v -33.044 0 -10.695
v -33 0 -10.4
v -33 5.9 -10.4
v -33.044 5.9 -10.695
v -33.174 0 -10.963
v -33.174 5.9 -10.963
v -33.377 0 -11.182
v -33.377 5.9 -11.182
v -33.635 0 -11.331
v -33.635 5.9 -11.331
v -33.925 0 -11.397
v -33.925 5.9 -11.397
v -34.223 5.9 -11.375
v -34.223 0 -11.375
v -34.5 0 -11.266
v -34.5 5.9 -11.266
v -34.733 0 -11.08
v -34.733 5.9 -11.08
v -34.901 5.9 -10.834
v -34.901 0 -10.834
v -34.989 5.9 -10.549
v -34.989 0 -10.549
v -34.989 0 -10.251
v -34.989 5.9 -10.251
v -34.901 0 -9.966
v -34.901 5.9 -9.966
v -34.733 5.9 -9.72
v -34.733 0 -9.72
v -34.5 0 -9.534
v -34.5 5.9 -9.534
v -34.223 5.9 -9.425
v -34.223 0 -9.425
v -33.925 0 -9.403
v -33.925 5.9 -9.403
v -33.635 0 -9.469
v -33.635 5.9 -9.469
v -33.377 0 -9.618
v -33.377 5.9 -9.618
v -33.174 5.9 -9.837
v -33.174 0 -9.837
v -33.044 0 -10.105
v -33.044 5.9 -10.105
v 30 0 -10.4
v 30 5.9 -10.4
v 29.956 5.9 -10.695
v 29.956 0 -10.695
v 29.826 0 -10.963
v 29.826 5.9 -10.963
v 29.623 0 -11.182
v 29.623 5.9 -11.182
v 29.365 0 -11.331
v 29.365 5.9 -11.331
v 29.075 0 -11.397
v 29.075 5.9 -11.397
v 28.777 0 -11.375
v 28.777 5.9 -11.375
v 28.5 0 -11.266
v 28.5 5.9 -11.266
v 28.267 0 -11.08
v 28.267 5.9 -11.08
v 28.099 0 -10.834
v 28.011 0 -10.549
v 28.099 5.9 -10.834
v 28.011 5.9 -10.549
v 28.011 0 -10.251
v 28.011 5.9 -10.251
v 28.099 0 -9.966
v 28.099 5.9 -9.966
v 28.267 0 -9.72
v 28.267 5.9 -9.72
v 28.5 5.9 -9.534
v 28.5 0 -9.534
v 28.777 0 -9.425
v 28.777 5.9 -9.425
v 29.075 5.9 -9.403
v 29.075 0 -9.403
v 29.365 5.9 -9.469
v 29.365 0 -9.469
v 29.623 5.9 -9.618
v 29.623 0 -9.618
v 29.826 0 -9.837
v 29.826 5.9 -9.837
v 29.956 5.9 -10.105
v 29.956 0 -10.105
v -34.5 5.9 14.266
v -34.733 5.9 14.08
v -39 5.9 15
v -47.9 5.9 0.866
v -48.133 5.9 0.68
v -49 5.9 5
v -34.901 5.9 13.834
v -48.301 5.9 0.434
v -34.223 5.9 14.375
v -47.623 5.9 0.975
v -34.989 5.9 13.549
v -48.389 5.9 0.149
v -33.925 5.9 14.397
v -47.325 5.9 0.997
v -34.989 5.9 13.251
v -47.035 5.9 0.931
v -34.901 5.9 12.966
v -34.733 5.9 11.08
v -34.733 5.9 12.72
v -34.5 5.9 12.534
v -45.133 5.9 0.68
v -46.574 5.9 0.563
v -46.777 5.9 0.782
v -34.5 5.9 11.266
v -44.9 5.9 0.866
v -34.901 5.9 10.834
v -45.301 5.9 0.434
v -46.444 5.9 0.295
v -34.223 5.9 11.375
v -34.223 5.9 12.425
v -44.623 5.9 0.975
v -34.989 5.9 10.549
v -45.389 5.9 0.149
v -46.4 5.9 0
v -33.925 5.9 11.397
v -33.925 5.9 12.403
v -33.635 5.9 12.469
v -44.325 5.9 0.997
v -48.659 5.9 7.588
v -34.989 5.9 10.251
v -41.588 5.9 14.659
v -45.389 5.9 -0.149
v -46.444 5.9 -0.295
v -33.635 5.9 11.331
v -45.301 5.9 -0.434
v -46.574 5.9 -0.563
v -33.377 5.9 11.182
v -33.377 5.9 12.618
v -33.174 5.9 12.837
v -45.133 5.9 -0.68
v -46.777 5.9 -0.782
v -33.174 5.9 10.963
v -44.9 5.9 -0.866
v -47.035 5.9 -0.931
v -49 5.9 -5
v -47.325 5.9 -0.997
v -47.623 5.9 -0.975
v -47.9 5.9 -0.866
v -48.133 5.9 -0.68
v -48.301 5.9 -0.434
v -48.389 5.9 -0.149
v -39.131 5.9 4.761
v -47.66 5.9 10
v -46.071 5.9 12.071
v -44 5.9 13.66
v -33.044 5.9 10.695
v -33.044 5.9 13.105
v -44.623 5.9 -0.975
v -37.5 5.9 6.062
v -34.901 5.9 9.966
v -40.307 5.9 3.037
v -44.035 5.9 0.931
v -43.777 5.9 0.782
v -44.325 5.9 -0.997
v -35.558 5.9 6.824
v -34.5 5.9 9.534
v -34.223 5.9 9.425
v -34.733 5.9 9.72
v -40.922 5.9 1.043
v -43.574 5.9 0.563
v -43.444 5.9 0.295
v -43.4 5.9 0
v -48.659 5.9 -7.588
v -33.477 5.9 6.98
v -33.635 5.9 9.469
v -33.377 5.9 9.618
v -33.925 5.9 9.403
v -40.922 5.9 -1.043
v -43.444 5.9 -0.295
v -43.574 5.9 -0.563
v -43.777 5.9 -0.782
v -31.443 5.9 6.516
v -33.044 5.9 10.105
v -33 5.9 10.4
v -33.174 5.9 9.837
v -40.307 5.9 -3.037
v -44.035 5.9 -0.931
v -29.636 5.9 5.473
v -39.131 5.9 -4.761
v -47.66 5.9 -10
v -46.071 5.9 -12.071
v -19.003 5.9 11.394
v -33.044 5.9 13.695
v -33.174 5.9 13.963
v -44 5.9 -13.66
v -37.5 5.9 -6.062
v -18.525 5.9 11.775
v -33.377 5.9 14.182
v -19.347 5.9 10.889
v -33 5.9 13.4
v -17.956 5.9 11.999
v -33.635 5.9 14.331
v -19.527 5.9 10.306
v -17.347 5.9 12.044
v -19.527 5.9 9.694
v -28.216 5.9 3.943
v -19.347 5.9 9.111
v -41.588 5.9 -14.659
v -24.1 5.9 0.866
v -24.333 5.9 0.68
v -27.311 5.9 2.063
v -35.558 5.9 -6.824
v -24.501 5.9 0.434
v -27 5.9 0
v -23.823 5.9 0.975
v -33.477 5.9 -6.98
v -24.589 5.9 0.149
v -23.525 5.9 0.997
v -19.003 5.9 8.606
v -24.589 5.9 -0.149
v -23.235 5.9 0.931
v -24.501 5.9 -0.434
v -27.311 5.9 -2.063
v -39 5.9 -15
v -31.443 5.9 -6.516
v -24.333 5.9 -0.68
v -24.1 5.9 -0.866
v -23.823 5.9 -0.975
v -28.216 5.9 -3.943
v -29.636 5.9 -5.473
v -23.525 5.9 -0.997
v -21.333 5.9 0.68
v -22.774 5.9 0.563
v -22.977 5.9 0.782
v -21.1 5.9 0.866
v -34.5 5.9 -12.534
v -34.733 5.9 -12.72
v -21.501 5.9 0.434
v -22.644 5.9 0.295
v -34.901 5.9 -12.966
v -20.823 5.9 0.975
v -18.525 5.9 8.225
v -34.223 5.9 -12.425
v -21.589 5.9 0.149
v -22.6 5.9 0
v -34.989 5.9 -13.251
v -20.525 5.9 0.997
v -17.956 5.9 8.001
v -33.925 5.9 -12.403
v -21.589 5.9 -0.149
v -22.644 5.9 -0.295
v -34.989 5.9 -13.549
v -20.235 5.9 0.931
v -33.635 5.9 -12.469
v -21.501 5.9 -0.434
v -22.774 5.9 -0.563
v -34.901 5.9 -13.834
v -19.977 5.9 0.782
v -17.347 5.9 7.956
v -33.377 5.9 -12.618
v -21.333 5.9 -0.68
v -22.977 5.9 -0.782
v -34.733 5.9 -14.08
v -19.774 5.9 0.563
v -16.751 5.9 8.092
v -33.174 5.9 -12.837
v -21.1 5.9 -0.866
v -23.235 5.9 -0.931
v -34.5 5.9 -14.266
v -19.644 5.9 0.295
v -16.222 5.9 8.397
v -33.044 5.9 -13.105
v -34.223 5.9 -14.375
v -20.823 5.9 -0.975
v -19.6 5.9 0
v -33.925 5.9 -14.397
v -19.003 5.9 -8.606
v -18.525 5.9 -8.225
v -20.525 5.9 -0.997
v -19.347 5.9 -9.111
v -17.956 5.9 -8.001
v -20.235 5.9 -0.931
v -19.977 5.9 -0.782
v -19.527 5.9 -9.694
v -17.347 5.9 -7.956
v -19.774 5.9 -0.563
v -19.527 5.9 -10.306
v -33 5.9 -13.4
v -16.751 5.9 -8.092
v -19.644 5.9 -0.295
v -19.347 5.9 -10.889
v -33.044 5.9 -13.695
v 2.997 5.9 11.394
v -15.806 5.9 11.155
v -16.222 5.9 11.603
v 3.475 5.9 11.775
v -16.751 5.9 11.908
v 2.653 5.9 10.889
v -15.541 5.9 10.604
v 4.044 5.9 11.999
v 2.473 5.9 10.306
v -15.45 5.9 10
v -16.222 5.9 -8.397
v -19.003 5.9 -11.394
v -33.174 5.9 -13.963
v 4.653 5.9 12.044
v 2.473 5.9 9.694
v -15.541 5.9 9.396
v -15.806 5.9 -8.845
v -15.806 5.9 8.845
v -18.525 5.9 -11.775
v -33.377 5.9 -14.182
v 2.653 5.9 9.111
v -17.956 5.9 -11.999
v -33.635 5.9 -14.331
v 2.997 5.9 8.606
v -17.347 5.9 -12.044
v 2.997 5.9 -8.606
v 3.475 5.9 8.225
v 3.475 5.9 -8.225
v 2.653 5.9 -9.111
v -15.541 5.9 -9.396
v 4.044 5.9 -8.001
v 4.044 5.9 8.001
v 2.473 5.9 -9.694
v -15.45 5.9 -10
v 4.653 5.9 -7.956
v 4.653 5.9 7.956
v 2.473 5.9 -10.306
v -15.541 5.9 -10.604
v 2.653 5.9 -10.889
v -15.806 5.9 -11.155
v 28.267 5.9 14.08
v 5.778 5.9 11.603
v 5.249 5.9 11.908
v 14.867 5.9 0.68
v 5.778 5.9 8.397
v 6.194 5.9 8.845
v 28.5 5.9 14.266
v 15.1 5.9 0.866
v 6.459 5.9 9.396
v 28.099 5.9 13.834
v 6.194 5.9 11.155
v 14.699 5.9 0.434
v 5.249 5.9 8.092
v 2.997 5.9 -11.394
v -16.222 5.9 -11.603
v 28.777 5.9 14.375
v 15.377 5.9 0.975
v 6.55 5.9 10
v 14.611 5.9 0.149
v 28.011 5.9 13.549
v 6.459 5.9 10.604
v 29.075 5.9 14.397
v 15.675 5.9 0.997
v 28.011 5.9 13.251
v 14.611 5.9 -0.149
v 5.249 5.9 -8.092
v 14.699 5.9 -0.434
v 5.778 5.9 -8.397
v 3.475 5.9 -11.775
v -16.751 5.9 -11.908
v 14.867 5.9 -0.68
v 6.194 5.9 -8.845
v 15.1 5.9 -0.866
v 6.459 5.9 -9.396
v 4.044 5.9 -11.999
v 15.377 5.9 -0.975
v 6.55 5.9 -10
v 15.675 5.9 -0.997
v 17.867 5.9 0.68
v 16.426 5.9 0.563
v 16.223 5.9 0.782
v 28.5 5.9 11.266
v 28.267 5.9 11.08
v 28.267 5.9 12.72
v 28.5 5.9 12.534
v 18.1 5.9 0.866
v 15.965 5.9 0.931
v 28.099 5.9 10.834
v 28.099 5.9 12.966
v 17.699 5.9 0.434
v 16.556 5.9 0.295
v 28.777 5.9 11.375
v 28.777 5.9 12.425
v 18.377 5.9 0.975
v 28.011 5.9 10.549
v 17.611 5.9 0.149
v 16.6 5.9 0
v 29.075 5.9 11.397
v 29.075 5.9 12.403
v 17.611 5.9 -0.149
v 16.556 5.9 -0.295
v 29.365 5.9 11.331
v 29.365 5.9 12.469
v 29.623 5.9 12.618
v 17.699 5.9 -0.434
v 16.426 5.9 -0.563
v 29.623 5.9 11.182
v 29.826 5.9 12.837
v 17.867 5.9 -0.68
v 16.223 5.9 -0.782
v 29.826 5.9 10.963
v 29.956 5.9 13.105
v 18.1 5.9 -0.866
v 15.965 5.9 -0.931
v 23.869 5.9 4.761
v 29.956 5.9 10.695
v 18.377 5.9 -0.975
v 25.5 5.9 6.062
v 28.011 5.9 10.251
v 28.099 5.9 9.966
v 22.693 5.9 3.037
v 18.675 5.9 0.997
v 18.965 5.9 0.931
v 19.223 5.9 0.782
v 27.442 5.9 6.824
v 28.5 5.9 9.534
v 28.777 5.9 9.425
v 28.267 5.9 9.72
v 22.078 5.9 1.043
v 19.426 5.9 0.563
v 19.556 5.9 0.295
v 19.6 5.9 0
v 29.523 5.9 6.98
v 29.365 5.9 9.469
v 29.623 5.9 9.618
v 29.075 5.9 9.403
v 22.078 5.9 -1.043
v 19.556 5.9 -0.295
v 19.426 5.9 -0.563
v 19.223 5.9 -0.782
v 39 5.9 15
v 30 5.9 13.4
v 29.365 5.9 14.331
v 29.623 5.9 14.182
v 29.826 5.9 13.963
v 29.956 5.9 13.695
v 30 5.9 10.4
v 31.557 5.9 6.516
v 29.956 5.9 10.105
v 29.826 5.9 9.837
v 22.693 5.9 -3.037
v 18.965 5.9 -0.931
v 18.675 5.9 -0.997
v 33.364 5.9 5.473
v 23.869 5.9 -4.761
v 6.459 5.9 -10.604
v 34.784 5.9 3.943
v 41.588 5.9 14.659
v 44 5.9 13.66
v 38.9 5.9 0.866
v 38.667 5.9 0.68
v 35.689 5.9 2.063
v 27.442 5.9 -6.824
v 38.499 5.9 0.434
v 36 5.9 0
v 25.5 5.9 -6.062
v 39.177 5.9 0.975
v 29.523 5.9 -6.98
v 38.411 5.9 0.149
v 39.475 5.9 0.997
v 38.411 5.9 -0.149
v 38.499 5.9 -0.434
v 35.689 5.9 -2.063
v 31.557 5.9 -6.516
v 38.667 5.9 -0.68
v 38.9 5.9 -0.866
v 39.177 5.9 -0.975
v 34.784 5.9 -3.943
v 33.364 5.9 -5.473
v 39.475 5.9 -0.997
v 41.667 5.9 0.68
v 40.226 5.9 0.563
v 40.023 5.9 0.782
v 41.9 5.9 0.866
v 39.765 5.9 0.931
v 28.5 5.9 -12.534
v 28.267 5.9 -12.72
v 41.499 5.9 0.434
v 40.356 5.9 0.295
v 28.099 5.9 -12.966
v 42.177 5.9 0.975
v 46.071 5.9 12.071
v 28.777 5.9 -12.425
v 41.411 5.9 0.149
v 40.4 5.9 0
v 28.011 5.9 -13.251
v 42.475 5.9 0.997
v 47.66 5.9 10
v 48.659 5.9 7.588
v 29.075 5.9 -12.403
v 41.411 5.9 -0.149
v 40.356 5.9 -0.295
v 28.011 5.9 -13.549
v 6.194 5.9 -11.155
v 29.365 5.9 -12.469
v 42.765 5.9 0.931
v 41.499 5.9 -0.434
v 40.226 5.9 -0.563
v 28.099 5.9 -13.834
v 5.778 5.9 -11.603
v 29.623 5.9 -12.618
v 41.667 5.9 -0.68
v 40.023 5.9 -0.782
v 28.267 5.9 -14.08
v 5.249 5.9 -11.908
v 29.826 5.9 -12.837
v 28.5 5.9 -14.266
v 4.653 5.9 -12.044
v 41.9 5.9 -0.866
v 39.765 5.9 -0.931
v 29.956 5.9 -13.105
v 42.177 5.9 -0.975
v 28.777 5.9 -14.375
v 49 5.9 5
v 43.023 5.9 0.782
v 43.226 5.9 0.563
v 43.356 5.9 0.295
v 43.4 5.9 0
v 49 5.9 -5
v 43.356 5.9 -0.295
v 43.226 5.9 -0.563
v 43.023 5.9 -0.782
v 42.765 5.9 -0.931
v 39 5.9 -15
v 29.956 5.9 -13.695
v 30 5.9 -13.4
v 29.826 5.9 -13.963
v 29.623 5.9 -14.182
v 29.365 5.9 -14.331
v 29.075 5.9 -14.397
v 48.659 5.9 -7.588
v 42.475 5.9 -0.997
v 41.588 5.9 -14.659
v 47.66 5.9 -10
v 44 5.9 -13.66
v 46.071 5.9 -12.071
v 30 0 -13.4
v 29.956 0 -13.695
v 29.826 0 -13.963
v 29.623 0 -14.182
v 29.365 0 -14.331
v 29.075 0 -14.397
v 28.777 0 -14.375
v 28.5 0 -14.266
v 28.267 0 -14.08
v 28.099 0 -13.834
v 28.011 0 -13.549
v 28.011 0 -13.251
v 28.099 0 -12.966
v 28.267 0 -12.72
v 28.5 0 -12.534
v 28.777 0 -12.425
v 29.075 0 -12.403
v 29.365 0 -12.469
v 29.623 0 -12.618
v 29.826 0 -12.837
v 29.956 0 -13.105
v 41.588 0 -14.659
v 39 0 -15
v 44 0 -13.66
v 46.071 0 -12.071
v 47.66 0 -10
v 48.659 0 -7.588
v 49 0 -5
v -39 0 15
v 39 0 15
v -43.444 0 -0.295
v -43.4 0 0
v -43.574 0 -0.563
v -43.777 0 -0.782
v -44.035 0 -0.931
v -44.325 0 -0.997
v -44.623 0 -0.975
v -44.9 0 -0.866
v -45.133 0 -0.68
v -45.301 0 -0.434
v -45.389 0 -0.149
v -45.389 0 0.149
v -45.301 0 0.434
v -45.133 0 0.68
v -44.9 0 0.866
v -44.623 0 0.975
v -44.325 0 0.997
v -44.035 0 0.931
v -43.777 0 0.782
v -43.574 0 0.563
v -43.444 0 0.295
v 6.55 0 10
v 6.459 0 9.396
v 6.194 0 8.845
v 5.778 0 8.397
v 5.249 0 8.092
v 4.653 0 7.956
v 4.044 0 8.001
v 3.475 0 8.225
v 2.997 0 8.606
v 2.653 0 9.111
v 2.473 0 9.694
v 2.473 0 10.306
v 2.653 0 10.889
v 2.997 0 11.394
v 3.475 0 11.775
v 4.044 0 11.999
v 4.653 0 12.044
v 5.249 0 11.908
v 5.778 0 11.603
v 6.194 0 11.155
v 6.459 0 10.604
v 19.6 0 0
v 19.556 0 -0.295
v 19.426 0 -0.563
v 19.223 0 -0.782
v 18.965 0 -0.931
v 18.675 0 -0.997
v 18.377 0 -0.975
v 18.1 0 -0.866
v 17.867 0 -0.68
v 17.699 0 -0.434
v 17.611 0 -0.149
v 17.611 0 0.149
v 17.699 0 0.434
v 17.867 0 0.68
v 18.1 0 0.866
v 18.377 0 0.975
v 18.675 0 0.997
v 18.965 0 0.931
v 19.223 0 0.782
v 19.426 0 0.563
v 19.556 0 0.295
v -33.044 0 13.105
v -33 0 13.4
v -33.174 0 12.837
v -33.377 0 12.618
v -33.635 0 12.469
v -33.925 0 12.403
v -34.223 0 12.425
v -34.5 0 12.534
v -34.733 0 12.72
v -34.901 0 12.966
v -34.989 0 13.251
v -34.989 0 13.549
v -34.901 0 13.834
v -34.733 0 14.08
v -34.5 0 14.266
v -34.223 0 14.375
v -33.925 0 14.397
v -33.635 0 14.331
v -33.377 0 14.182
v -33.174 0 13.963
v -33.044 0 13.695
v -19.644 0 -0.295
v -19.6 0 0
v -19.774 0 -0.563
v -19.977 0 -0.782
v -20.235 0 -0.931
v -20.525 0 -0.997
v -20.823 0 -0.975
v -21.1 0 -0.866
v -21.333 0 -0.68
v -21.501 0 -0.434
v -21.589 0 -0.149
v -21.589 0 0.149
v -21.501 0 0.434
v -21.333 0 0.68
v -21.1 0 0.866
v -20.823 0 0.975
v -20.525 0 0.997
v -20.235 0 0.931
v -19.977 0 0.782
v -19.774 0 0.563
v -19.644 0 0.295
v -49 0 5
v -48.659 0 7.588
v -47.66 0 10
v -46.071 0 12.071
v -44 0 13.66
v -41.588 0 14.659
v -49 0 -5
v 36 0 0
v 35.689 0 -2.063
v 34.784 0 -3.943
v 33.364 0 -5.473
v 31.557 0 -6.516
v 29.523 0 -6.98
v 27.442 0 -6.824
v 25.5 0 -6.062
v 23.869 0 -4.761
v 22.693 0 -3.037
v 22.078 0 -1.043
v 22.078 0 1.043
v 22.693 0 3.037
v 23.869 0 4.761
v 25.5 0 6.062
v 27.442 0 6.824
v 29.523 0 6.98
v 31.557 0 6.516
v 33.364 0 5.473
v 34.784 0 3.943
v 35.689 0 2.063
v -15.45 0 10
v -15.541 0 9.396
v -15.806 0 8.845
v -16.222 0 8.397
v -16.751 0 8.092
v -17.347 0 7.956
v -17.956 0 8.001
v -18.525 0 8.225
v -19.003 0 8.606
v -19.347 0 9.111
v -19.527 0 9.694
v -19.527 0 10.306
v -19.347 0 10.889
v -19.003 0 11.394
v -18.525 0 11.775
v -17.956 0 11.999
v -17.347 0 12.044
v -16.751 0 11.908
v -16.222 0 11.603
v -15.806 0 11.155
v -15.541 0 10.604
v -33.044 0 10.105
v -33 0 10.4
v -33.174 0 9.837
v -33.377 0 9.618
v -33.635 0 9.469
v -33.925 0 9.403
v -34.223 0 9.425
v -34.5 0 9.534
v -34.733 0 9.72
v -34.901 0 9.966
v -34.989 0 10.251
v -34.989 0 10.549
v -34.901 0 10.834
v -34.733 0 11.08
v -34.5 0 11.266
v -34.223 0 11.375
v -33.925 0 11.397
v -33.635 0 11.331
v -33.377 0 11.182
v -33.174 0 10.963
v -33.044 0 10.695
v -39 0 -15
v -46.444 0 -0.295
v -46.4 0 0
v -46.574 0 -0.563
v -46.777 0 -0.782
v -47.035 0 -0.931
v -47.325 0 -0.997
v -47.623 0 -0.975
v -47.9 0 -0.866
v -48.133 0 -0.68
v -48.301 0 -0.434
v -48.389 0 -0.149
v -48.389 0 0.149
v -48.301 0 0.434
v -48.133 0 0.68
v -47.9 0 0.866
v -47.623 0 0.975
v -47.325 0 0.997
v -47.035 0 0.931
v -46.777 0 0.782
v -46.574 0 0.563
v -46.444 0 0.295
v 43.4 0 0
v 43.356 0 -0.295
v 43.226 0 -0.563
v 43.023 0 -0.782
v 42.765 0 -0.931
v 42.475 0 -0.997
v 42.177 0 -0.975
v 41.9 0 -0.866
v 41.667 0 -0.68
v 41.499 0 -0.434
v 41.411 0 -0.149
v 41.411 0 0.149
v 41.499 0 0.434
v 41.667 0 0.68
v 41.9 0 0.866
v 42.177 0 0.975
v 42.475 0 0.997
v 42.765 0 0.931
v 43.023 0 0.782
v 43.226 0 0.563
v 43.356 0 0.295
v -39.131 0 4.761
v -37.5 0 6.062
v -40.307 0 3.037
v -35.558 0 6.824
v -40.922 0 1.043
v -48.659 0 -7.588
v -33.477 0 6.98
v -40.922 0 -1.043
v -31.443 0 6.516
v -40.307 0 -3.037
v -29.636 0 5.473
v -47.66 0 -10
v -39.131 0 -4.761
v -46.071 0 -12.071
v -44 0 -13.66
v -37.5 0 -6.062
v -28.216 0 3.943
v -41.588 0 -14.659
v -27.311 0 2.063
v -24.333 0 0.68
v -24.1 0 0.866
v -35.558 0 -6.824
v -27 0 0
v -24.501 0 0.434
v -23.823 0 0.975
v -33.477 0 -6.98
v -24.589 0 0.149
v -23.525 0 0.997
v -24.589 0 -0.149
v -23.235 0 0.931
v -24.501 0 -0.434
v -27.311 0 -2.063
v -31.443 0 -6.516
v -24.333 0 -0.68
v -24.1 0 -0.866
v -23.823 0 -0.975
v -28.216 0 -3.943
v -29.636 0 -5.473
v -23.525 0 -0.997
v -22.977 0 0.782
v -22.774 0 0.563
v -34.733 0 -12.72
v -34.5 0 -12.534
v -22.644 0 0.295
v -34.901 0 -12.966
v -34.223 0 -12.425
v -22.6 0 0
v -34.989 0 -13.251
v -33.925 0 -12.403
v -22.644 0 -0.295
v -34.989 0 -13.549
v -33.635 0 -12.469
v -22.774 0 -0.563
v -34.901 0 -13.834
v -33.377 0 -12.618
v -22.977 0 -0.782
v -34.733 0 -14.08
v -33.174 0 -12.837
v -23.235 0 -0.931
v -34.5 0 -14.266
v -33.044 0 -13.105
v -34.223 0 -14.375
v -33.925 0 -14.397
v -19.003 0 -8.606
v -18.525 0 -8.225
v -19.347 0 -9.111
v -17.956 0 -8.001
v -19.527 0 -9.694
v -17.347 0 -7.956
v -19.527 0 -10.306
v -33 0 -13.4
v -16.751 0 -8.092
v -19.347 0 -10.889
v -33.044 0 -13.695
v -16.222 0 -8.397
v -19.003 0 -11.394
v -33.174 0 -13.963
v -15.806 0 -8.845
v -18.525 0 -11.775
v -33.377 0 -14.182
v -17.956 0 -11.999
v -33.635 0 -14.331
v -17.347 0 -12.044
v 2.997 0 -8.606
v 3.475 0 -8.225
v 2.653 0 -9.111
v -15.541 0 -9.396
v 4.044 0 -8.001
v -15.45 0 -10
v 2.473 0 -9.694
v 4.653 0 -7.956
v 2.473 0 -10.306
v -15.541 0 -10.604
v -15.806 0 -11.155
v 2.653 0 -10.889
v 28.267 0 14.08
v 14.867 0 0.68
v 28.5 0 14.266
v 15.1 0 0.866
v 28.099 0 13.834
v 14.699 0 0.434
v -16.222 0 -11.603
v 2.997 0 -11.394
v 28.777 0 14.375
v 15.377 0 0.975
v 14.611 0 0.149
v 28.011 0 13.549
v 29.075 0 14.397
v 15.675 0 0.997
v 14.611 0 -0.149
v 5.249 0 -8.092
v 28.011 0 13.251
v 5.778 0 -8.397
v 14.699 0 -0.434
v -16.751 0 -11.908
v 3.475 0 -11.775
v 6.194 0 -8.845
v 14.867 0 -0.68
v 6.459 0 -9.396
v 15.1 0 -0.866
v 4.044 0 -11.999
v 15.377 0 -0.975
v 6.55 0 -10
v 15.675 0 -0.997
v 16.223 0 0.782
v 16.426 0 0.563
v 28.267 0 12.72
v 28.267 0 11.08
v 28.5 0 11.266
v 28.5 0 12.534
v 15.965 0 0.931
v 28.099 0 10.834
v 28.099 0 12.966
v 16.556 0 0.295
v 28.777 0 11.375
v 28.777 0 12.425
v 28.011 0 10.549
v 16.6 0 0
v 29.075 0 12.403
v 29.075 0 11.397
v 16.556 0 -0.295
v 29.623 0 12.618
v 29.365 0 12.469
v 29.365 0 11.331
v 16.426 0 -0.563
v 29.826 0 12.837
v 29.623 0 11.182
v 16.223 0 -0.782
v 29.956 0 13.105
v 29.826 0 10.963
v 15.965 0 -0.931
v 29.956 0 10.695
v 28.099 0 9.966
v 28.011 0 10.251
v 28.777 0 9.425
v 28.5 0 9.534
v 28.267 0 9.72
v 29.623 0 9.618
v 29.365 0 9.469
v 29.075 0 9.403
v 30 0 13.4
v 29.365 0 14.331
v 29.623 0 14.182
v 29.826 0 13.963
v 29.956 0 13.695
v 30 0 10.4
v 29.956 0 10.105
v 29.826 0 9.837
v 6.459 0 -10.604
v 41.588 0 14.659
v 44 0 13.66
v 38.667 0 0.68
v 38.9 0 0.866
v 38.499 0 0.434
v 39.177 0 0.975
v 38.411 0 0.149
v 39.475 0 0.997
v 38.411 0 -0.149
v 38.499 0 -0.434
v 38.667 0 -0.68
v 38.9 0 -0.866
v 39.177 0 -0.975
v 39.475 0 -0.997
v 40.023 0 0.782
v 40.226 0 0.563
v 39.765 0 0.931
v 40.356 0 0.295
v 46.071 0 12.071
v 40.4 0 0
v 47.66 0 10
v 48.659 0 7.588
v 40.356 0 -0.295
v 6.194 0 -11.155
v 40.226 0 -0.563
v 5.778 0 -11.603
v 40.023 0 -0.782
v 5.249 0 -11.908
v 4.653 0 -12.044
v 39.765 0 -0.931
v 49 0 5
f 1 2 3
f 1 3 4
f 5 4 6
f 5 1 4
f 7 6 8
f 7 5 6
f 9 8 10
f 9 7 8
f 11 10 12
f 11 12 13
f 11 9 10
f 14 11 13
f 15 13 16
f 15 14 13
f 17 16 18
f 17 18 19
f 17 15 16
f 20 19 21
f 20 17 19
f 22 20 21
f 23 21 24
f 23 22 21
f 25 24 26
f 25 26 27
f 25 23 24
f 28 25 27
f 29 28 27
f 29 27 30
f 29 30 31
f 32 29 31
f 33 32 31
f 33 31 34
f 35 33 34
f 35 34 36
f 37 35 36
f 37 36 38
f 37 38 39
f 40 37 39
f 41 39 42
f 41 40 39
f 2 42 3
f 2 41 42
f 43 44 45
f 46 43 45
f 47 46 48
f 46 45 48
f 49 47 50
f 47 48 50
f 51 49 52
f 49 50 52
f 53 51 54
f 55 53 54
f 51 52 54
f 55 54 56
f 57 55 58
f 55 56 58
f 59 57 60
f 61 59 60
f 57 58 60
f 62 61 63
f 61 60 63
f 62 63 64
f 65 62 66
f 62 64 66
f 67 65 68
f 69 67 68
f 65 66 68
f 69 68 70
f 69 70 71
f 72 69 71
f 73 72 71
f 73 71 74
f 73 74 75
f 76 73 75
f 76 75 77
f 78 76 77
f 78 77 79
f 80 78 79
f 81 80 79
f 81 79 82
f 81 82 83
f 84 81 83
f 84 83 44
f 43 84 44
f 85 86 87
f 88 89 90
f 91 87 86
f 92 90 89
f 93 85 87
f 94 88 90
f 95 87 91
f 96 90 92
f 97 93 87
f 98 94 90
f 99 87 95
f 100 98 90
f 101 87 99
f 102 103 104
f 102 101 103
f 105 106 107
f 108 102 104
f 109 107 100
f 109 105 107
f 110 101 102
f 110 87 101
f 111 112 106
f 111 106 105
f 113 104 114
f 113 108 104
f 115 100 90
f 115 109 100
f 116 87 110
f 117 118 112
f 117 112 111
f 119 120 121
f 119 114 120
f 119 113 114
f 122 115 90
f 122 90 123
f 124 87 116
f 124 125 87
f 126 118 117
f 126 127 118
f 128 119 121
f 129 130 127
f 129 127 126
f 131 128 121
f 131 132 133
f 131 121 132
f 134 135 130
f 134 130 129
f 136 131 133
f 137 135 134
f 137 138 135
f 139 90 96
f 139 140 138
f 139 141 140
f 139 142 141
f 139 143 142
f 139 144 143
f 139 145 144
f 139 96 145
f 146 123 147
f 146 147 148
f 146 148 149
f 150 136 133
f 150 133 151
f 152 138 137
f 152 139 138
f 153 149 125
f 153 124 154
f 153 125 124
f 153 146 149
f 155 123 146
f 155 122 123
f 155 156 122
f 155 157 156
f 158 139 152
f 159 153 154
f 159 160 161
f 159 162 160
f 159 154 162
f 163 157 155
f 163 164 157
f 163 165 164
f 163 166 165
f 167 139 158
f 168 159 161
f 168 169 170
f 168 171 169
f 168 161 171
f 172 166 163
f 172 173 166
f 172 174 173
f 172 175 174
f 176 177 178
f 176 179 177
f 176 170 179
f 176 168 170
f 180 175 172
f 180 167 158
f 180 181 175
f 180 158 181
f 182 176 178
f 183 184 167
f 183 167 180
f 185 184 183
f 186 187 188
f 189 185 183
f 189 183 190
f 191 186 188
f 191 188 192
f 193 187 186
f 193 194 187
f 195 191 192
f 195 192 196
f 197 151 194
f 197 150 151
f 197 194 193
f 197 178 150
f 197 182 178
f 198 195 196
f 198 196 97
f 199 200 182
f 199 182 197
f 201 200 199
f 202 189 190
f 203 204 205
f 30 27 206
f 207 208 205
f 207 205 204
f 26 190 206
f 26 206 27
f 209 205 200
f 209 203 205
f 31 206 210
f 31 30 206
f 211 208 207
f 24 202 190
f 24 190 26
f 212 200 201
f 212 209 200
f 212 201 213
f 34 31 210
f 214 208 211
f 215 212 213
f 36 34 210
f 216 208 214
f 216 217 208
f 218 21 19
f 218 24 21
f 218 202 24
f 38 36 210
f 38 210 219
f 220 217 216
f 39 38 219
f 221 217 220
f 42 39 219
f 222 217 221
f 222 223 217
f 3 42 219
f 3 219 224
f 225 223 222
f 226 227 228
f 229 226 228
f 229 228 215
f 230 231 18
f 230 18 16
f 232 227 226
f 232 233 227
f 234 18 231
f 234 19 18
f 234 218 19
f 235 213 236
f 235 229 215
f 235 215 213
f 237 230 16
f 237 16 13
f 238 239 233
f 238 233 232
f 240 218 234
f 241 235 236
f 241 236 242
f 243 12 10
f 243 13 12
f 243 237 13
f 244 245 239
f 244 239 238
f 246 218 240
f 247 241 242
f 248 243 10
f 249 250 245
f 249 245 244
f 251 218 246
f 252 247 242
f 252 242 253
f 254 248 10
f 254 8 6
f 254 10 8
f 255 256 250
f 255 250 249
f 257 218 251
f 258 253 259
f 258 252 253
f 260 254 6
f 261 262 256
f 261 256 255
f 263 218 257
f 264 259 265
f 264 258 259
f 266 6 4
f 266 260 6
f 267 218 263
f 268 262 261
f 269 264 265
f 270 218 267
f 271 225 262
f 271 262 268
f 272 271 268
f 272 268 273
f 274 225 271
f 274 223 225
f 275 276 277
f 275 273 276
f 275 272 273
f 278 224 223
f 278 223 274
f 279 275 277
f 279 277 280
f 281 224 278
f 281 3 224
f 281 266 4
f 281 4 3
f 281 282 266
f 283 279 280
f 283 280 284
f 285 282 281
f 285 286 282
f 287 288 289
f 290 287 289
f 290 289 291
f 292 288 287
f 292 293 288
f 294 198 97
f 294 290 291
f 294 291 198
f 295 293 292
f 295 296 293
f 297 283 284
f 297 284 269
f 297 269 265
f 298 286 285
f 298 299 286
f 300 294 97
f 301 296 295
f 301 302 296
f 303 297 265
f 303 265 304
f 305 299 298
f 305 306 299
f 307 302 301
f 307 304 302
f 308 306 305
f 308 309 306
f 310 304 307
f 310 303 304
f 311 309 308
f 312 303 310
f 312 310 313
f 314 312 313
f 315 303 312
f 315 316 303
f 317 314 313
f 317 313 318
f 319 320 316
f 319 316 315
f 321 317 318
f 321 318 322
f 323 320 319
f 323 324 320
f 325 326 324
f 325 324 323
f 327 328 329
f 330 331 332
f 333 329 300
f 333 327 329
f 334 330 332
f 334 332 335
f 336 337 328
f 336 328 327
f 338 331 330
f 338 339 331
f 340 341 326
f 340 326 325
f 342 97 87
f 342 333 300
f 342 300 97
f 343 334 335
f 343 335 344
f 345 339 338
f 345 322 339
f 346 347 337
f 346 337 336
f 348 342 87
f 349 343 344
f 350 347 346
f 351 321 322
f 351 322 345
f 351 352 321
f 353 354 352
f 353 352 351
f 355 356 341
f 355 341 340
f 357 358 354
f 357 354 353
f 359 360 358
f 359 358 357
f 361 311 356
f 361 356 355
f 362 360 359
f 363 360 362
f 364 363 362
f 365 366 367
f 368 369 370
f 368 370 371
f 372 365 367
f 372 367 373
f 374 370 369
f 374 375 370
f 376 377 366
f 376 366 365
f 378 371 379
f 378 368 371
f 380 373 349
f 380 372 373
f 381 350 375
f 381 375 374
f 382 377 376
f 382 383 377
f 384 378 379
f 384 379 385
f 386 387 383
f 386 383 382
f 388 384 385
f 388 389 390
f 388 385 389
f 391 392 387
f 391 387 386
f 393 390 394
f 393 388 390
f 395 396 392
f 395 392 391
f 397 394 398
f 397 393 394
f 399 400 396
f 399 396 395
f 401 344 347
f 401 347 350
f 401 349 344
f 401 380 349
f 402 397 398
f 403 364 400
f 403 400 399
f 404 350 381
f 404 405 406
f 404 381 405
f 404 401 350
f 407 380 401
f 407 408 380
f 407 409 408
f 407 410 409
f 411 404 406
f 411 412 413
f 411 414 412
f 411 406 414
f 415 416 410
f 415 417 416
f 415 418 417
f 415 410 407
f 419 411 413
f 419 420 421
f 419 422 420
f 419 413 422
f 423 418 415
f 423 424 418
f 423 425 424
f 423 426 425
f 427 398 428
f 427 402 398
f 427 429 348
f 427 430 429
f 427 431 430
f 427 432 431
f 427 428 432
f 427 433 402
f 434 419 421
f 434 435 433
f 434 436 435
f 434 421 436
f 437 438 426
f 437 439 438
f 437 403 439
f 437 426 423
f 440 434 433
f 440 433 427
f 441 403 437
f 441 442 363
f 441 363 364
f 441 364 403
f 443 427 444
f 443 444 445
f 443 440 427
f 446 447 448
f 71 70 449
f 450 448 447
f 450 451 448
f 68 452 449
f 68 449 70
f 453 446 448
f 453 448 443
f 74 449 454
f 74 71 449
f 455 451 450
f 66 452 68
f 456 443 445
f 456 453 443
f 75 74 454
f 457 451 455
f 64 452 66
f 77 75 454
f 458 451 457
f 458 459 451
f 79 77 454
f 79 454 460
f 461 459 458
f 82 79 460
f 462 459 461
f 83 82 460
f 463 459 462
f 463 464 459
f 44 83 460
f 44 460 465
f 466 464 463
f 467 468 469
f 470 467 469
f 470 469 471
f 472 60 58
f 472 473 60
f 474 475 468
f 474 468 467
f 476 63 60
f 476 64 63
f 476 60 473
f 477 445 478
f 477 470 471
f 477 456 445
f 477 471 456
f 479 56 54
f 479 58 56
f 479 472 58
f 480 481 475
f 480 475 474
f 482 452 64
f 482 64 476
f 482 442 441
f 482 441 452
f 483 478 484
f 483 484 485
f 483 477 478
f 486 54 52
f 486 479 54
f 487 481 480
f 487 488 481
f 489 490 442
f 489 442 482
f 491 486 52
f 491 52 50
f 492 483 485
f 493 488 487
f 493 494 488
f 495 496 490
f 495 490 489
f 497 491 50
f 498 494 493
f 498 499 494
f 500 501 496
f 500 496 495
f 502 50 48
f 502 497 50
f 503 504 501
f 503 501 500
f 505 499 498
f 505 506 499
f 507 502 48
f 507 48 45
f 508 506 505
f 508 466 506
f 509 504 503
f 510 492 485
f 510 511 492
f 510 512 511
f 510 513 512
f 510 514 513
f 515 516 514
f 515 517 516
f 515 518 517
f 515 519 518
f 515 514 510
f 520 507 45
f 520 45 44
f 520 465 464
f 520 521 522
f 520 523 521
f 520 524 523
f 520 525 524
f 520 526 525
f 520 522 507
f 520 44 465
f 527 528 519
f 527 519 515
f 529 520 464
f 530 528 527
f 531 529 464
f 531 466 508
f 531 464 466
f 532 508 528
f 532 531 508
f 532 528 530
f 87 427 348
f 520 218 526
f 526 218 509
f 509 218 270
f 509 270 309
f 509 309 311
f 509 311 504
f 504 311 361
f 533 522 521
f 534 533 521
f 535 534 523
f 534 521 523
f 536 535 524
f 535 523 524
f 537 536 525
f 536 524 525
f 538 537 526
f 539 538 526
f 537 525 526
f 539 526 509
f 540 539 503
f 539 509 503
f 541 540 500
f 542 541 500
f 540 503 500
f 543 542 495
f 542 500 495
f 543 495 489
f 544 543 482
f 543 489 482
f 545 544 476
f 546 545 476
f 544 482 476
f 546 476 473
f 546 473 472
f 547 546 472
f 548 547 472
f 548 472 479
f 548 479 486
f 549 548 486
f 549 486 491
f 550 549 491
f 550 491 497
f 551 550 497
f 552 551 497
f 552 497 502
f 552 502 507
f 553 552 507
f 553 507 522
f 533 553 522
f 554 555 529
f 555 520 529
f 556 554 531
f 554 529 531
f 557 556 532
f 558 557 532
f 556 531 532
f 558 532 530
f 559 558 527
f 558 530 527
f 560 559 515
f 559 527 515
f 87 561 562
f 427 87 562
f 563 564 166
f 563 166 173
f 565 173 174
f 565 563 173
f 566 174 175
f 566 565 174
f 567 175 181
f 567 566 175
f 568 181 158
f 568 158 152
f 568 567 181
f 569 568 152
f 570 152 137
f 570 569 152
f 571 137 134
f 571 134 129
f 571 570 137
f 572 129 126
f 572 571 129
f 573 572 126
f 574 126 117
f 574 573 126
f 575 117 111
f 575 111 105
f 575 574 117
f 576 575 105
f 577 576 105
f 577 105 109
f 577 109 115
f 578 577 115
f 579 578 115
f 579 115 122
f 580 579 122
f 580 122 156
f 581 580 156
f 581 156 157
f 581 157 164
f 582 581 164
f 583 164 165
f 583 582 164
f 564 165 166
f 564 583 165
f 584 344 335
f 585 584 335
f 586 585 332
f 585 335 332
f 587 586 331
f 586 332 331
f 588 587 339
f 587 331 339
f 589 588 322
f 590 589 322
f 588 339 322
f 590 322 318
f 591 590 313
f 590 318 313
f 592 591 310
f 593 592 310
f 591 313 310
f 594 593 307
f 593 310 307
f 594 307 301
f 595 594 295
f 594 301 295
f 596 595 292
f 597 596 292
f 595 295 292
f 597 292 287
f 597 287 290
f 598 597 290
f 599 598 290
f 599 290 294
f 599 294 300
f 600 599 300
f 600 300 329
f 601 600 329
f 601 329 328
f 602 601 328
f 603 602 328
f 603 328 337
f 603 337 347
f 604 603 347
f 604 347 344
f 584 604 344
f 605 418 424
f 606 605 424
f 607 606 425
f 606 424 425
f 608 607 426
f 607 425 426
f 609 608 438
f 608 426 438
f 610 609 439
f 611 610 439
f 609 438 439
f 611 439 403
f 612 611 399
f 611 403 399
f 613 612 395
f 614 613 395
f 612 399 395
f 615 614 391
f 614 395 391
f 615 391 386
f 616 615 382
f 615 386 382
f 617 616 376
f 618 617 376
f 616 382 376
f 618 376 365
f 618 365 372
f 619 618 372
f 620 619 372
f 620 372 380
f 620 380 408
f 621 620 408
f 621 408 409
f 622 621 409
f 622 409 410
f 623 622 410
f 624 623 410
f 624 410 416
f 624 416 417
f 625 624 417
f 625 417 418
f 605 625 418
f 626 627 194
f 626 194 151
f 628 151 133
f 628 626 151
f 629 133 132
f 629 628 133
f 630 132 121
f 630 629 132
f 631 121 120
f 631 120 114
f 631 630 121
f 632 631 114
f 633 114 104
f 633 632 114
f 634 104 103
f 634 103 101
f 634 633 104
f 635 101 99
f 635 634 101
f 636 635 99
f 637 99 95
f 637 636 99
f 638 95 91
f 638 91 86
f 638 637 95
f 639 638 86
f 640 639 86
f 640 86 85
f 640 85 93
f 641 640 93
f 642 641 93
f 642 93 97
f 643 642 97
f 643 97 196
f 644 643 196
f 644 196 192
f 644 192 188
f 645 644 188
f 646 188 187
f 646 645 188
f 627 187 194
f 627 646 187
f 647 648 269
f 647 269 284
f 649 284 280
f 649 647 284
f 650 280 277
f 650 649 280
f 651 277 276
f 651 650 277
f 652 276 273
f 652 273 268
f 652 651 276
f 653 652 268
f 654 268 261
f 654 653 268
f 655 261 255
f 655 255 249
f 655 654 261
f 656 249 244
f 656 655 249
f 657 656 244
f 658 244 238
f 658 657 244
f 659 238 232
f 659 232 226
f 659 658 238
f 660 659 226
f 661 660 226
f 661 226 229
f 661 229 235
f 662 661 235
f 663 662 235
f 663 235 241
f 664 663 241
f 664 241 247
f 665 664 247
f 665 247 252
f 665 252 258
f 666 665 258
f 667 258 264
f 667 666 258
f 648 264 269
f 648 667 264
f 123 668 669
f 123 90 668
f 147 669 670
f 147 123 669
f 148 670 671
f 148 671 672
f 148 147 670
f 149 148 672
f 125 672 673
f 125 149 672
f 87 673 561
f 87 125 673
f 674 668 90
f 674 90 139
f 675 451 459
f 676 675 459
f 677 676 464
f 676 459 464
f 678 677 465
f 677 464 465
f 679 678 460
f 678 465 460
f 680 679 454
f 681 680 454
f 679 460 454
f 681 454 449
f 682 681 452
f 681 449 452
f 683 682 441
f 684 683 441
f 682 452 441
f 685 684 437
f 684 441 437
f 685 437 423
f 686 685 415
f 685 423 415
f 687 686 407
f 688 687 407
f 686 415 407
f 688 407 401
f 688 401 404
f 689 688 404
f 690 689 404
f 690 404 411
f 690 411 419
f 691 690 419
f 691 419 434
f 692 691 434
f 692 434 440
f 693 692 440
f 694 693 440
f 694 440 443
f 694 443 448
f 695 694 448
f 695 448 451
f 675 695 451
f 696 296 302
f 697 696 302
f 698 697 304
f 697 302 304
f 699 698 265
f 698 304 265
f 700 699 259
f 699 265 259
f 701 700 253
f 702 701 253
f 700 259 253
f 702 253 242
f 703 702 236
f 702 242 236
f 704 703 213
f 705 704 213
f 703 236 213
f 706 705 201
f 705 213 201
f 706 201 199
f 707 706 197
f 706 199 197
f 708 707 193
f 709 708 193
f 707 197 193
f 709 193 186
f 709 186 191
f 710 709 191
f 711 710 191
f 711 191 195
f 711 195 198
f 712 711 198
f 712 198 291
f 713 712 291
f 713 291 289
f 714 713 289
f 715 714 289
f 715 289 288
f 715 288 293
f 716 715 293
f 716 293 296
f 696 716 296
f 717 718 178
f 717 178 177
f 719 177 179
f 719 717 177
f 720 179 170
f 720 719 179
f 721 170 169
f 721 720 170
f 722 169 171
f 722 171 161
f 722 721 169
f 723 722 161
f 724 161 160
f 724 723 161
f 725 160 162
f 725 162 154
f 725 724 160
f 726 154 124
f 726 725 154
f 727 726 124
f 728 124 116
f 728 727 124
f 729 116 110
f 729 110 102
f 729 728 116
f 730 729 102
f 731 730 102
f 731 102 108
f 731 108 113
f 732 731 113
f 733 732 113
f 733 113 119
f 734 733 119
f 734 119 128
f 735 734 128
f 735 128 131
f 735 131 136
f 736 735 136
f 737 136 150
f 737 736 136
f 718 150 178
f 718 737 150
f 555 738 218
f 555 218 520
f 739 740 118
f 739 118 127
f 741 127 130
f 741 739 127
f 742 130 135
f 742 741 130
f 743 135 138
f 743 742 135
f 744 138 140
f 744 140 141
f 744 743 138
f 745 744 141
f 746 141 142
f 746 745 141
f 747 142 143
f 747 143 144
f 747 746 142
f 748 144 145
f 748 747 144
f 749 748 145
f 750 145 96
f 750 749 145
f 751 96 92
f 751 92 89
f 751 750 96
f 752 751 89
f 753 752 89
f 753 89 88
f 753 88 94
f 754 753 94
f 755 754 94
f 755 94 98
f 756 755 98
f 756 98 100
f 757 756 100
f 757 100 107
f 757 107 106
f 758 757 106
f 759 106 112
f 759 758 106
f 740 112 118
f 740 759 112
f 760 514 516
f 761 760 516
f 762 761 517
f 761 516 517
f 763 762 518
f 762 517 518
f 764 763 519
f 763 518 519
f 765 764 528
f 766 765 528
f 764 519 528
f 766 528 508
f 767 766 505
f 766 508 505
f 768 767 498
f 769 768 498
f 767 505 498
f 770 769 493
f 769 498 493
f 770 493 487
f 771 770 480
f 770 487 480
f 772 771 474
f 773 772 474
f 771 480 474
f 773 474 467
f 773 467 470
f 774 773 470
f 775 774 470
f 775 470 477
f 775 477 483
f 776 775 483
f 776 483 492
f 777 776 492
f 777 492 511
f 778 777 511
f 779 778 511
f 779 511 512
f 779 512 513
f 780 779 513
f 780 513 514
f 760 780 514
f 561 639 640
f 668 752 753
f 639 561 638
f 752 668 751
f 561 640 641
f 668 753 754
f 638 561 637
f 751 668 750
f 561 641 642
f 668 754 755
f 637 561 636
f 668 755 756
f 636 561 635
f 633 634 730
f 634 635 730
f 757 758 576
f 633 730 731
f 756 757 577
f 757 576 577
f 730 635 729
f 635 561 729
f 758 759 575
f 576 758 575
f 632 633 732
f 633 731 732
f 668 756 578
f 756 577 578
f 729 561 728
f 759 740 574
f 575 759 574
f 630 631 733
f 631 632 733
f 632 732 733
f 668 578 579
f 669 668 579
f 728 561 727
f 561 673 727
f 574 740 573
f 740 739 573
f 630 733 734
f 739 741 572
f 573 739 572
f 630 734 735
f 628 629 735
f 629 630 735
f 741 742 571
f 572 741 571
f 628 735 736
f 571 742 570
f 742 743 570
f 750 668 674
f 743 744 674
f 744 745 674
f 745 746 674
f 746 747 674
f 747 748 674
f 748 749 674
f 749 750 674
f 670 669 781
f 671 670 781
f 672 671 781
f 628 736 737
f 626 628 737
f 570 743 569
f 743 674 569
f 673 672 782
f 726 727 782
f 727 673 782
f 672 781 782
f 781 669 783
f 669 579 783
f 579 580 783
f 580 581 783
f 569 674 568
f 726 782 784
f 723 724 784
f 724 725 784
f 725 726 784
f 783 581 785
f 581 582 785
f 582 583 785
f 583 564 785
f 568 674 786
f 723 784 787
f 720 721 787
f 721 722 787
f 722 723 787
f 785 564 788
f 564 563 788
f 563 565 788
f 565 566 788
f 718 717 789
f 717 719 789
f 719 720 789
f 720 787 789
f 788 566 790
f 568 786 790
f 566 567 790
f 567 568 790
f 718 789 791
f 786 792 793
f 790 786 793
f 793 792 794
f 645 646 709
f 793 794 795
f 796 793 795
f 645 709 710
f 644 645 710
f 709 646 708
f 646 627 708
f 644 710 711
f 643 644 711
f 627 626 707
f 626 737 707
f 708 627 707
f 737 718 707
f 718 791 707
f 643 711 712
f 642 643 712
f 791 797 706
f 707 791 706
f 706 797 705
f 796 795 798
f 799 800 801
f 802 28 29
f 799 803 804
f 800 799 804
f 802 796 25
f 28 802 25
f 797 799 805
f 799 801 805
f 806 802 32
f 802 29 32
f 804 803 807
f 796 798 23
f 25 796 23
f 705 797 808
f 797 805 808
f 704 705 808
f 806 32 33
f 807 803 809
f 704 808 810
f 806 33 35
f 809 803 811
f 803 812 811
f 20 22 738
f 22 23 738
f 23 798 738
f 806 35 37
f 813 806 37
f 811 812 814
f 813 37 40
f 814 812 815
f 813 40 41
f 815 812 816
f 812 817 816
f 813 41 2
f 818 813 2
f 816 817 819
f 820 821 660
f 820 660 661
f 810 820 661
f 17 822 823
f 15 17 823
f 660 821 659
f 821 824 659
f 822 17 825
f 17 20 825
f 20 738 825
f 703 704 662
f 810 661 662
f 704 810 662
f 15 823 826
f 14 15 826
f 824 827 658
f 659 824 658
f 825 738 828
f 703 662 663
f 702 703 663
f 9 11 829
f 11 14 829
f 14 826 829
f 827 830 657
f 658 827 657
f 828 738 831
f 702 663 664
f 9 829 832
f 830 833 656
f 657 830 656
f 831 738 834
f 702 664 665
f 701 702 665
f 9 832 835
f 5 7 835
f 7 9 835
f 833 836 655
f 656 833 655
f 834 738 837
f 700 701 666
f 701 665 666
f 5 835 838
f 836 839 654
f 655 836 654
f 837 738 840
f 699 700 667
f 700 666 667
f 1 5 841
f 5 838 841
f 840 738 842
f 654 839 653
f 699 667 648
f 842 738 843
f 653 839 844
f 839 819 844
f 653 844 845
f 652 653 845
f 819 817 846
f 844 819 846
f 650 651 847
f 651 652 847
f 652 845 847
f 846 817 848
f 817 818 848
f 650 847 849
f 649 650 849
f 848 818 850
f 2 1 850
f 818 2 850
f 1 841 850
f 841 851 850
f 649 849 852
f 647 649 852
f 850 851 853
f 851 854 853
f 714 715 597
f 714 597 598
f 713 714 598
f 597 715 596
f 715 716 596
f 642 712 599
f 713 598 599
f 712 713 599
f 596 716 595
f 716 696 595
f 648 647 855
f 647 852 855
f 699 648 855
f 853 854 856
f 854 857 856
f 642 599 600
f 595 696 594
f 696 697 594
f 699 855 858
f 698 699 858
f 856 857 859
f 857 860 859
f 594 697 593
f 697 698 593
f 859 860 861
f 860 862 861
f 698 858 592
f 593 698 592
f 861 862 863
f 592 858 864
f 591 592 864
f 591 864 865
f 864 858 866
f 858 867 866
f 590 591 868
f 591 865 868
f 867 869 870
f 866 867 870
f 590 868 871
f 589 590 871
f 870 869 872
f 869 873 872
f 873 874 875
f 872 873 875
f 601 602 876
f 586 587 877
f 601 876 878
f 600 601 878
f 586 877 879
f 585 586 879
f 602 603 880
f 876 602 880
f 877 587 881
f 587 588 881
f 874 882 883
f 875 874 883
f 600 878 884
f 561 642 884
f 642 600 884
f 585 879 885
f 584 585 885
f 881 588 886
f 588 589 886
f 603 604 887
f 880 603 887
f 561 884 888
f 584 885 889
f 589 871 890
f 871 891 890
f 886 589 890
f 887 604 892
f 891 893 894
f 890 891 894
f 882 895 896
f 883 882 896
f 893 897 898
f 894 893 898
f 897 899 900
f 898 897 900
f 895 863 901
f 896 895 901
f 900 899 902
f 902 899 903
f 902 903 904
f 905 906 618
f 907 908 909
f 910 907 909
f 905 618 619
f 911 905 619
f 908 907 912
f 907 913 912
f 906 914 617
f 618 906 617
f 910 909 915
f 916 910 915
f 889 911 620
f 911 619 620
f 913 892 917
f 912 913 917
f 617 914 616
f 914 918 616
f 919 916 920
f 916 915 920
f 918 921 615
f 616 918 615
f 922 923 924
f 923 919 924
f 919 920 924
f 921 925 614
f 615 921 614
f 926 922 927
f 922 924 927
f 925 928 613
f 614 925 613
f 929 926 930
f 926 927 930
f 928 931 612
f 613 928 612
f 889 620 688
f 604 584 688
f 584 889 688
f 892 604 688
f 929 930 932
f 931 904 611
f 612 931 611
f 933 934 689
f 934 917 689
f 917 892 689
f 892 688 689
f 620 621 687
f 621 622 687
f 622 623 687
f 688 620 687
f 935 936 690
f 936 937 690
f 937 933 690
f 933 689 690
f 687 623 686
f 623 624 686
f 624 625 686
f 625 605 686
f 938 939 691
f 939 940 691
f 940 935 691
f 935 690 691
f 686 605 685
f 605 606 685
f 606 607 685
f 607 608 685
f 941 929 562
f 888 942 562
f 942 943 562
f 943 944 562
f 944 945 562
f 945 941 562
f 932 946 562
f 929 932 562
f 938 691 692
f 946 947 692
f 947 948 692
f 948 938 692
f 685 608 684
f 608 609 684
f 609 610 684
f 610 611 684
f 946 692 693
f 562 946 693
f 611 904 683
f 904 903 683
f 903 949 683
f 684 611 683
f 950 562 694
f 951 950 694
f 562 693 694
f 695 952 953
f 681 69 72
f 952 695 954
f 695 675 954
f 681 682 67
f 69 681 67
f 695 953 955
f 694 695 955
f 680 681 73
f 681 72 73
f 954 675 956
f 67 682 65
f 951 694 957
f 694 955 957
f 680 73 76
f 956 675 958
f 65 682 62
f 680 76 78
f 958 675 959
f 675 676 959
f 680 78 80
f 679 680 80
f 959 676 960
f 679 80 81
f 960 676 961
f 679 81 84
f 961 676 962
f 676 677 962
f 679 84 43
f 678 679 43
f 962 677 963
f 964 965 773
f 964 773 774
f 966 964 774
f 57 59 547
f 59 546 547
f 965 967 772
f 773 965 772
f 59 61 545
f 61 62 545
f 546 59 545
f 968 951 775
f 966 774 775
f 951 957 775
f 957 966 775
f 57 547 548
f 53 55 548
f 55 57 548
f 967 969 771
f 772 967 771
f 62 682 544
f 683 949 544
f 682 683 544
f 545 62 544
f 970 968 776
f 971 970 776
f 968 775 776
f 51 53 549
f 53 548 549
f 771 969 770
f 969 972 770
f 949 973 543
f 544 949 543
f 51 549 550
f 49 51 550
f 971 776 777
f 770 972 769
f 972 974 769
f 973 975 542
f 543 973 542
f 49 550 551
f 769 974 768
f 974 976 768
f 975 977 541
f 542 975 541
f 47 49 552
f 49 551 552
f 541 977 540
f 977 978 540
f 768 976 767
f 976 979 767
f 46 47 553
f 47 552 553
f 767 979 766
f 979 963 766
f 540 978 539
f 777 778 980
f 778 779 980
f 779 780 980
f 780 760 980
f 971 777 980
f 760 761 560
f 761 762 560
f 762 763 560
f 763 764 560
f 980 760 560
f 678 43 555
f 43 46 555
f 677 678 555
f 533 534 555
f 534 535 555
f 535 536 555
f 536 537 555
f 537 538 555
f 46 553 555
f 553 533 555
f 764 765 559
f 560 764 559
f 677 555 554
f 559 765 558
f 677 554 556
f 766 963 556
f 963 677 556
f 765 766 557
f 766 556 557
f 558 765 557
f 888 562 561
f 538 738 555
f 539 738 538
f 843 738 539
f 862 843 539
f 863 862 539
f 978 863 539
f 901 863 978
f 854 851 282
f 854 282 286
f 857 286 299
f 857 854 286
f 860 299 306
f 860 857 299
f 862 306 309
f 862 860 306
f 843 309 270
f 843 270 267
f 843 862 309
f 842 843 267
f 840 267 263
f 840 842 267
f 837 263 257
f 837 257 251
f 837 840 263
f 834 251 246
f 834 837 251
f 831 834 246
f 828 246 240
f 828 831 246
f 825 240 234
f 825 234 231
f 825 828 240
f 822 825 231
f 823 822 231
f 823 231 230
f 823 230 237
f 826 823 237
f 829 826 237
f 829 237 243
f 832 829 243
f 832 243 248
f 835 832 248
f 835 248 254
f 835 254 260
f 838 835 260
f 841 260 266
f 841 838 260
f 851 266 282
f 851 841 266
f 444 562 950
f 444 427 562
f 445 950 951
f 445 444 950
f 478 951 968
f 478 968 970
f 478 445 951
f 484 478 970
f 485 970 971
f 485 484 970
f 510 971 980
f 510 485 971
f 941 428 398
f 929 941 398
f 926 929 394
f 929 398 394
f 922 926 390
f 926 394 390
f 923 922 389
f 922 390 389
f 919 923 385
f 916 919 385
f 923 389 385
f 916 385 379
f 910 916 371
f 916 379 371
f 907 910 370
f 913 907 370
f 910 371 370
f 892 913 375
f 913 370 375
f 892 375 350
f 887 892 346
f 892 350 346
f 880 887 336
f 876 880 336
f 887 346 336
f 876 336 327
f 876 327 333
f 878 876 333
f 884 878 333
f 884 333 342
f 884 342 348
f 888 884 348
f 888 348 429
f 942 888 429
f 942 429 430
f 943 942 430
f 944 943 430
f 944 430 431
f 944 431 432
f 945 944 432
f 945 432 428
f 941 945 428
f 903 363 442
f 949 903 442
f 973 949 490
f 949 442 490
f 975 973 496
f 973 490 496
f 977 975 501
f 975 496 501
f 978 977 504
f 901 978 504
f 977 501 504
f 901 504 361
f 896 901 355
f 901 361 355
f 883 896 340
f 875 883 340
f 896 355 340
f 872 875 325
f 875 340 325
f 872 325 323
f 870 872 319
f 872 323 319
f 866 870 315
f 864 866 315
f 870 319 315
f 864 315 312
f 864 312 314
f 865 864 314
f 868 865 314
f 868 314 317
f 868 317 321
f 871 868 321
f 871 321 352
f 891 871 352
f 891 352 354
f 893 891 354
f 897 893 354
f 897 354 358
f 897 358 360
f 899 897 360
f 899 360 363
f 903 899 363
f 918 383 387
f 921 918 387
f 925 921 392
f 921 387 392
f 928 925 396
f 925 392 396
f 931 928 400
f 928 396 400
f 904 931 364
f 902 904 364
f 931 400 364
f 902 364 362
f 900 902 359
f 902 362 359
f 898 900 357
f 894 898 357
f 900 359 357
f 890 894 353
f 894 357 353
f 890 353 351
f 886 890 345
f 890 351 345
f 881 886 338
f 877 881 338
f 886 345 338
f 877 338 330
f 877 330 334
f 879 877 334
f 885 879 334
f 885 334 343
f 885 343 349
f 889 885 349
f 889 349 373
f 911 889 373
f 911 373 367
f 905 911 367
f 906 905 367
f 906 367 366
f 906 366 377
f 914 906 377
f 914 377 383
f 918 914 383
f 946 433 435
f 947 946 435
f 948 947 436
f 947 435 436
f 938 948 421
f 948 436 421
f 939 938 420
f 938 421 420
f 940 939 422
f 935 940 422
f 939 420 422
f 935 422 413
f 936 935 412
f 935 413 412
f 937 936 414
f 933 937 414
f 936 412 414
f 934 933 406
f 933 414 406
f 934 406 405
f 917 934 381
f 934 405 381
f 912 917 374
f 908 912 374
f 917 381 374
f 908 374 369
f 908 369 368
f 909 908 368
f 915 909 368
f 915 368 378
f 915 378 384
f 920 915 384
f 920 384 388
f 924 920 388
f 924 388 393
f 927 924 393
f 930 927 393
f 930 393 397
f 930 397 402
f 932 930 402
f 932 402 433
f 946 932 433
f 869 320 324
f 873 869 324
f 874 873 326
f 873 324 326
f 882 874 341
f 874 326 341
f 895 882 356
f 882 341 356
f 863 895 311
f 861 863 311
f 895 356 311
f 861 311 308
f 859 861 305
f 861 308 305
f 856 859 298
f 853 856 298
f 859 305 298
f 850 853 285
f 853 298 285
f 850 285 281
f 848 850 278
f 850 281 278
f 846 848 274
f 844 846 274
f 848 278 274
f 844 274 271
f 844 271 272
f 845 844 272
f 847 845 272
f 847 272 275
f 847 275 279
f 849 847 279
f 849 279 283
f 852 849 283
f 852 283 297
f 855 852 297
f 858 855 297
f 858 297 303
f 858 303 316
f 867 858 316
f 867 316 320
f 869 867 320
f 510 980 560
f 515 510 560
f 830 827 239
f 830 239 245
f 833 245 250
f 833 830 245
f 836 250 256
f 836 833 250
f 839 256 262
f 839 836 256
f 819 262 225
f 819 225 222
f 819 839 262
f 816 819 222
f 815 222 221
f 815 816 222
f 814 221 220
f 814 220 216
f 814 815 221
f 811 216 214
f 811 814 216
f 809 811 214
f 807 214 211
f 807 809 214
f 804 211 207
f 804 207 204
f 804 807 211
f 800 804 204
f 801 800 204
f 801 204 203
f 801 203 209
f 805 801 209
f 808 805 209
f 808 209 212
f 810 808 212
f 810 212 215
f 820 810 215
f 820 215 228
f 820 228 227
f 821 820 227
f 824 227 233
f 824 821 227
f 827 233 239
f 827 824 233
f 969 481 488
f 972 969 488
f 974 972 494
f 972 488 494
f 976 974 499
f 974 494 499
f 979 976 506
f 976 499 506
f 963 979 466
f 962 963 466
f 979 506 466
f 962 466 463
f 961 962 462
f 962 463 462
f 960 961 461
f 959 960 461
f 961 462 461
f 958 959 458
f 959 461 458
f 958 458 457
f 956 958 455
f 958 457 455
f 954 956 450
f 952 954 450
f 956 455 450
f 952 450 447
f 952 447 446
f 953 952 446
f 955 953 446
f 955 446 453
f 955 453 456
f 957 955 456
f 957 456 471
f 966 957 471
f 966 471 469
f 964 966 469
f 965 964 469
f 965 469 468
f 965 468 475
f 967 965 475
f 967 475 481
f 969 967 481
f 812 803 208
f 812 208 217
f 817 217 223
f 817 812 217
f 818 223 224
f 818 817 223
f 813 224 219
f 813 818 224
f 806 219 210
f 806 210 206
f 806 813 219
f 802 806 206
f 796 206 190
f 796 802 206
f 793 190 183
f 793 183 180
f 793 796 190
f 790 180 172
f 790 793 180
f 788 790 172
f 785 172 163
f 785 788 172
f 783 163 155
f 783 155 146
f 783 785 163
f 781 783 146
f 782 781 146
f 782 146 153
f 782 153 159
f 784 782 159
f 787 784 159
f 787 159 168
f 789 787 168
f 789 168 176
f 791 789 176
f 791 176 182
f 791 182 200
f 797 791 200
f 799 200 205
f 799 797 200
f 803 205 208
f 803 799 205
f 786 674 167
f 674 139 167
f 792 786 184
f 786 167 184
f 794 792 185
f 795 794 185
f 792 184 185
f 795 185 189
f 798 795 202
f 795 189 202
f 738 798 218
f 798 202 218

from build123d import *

# Parameters (mm, degrees)
SKETCH1_W           = 98
SKETCH1_H           = 30
SKETCH1_R           = 7
SKETCH1_R_2         = 1
BOSS_EXTRUDE1_DEPTH = 5.9
SKETCH4_R           = 7
SKETCH4_R_2         = 1
CUT_EXTRUDE3_DEPTH  = 10
FILLET1_R           = 10
SKETCH5_R           = 2.05
CUT_EXTRUDE4_DEPTH  = 10


with BuildPart() as part:
    # Sketch1 → Boss-Extrude1 (new body)
    with BuildSketch(Plane(origin=(0, 0, 0), x_dir=(1, 0, 0), z_dir=(0, 1, 0))):
        Rectangle(SKETCH1_W, SKETCH1_H)
        with Locations((-34, 0)):
            Circle(SKETCH1_R, mode=Mode.SUBTRACT)
        with Locations((-44.4, 0)):
            Circle(SKETCH1_R_2, mode=Mode.SUBTRACT)
        with Locations((-47.4, 0)):
            Circle(SKETCH1_R_2, mode=Mode.SUBTRACT)
        with Locations((-34, 10.4)):
            Circle(SKETCH1_R_2, mode=Mode.SUBTRACT)
        with Locations((-34, 13.4)):
            Circle(SKETCH1_R_2, mode=Mode.SUBTRACT)
        with Locations((-23.6, 0)):
            Circle(SKETCH1_R_2, mode=Mode.SUBTRACT)
        with Locations((-20.6, 0)):
            Circle(SKETCH1_R_2, mode=Mode.SUBTRACT)
        with Locations((-34, -10.4)):
            Circle(SKETCH1_R_2, mode=Mode.SUBTRACT)
        with Locations((-34, -13.4)):
            Circle(SKETCH1_R_2, mode=Mode.SUBTRACT)
    extrude(amount=BOSS_EXTRUDE1_DEPTH)

    # Sketch4 → Cut-Extrude3 (cut)
    with BuildSketch(Plane(origin=(0, 5.9, 0), x_dir=(1, 0, 0), z_dir=(0, 1, 0))):
        with Locations((-34, 0)):
            Circle(SKETCH4_R)
        with Locations((-34, -13.4)):
            Circle(SKETCH4_R_2)
        with Locations((-34, -10.4)):
            Circle(SKETCH4_R_2)
        with Locations((-44.4, 0)):
            Circle(SKETCH4_R_2)
        with Locations((-47.4, 0)):
            Circle(SKETCH4_R_2)
        with Locations((-34, 13.4)):
            Circle(SKETCH4_R_2)
        with Locations((-23.6, 0)):
            Circle(SKETCH4_R_2)
        with Locations((-20.6, 0)):
            Circle(SKETCH4_R_2)
        with Locations((-34, 10.4)):
            Circle(SKETCH4_R_2)
        with Locations((29, -13.4)):
            Circle(SKETCH4_R_2)
        with Locations((29, -10.4)):
            Circle(SKETCH4_R_2)
        with Locations((42.4, 0)):
            Circle(SKETCH4_R_2)
        with Locations((39.4, 0)):
            Circle(SKETCH4_R_2)
        with Locations((29, 0)):
            Circle(SKETCH4_R)
        with Locations((29, 10.4)):
            Circle(SKETCH4_R_2)
        with Locations((29, 13.4)):
            Circle(SKETCH4_R_2)
        with Locations((18.6, 0)):
            Circle(SKETCH4_R_2)
        with Locations((15.6, 0)):
            Circle(SKETCH4_R_2)
    extrude(amount=-CUT_EXTRUDE3_DEPTH, mode=Mode.SUBTRACT)

    # Fillet1
    fillet1_edges = [part.edges().sort_by_distance(p)[0] for p in [
        (49, 2.95, 15),
        (-49, 2.95, 15),
        (-49, 2.95, -15),
        (49, 2.95, -15),
    ]]
    fillet(fillet1_edges, radius=FILLET1_R)

    # Sketch5 → Cut-Extrude4 (cut)
    with BuildSketch(Plane(origin=(0, 5.9, 0), x_dir=(1, 0, 0), z_dir=(0, 1, 0))):
        with Locations((-17.5, 10)):
            Circle(SKETCH5_R)
        with Locations((-17.5, -10)):
            Circle(SKETCH5_R)
        with Locations((4.5, -10)):
            Circle(SKETCH5_R)
        with Locations((4.5, 10)):
            Circle(SKETCH5_R)
    extrude(amount=-CUT_EXTRUDE4_DEPTH, mode=Mode.SUBTRACT)


solid = part.part
